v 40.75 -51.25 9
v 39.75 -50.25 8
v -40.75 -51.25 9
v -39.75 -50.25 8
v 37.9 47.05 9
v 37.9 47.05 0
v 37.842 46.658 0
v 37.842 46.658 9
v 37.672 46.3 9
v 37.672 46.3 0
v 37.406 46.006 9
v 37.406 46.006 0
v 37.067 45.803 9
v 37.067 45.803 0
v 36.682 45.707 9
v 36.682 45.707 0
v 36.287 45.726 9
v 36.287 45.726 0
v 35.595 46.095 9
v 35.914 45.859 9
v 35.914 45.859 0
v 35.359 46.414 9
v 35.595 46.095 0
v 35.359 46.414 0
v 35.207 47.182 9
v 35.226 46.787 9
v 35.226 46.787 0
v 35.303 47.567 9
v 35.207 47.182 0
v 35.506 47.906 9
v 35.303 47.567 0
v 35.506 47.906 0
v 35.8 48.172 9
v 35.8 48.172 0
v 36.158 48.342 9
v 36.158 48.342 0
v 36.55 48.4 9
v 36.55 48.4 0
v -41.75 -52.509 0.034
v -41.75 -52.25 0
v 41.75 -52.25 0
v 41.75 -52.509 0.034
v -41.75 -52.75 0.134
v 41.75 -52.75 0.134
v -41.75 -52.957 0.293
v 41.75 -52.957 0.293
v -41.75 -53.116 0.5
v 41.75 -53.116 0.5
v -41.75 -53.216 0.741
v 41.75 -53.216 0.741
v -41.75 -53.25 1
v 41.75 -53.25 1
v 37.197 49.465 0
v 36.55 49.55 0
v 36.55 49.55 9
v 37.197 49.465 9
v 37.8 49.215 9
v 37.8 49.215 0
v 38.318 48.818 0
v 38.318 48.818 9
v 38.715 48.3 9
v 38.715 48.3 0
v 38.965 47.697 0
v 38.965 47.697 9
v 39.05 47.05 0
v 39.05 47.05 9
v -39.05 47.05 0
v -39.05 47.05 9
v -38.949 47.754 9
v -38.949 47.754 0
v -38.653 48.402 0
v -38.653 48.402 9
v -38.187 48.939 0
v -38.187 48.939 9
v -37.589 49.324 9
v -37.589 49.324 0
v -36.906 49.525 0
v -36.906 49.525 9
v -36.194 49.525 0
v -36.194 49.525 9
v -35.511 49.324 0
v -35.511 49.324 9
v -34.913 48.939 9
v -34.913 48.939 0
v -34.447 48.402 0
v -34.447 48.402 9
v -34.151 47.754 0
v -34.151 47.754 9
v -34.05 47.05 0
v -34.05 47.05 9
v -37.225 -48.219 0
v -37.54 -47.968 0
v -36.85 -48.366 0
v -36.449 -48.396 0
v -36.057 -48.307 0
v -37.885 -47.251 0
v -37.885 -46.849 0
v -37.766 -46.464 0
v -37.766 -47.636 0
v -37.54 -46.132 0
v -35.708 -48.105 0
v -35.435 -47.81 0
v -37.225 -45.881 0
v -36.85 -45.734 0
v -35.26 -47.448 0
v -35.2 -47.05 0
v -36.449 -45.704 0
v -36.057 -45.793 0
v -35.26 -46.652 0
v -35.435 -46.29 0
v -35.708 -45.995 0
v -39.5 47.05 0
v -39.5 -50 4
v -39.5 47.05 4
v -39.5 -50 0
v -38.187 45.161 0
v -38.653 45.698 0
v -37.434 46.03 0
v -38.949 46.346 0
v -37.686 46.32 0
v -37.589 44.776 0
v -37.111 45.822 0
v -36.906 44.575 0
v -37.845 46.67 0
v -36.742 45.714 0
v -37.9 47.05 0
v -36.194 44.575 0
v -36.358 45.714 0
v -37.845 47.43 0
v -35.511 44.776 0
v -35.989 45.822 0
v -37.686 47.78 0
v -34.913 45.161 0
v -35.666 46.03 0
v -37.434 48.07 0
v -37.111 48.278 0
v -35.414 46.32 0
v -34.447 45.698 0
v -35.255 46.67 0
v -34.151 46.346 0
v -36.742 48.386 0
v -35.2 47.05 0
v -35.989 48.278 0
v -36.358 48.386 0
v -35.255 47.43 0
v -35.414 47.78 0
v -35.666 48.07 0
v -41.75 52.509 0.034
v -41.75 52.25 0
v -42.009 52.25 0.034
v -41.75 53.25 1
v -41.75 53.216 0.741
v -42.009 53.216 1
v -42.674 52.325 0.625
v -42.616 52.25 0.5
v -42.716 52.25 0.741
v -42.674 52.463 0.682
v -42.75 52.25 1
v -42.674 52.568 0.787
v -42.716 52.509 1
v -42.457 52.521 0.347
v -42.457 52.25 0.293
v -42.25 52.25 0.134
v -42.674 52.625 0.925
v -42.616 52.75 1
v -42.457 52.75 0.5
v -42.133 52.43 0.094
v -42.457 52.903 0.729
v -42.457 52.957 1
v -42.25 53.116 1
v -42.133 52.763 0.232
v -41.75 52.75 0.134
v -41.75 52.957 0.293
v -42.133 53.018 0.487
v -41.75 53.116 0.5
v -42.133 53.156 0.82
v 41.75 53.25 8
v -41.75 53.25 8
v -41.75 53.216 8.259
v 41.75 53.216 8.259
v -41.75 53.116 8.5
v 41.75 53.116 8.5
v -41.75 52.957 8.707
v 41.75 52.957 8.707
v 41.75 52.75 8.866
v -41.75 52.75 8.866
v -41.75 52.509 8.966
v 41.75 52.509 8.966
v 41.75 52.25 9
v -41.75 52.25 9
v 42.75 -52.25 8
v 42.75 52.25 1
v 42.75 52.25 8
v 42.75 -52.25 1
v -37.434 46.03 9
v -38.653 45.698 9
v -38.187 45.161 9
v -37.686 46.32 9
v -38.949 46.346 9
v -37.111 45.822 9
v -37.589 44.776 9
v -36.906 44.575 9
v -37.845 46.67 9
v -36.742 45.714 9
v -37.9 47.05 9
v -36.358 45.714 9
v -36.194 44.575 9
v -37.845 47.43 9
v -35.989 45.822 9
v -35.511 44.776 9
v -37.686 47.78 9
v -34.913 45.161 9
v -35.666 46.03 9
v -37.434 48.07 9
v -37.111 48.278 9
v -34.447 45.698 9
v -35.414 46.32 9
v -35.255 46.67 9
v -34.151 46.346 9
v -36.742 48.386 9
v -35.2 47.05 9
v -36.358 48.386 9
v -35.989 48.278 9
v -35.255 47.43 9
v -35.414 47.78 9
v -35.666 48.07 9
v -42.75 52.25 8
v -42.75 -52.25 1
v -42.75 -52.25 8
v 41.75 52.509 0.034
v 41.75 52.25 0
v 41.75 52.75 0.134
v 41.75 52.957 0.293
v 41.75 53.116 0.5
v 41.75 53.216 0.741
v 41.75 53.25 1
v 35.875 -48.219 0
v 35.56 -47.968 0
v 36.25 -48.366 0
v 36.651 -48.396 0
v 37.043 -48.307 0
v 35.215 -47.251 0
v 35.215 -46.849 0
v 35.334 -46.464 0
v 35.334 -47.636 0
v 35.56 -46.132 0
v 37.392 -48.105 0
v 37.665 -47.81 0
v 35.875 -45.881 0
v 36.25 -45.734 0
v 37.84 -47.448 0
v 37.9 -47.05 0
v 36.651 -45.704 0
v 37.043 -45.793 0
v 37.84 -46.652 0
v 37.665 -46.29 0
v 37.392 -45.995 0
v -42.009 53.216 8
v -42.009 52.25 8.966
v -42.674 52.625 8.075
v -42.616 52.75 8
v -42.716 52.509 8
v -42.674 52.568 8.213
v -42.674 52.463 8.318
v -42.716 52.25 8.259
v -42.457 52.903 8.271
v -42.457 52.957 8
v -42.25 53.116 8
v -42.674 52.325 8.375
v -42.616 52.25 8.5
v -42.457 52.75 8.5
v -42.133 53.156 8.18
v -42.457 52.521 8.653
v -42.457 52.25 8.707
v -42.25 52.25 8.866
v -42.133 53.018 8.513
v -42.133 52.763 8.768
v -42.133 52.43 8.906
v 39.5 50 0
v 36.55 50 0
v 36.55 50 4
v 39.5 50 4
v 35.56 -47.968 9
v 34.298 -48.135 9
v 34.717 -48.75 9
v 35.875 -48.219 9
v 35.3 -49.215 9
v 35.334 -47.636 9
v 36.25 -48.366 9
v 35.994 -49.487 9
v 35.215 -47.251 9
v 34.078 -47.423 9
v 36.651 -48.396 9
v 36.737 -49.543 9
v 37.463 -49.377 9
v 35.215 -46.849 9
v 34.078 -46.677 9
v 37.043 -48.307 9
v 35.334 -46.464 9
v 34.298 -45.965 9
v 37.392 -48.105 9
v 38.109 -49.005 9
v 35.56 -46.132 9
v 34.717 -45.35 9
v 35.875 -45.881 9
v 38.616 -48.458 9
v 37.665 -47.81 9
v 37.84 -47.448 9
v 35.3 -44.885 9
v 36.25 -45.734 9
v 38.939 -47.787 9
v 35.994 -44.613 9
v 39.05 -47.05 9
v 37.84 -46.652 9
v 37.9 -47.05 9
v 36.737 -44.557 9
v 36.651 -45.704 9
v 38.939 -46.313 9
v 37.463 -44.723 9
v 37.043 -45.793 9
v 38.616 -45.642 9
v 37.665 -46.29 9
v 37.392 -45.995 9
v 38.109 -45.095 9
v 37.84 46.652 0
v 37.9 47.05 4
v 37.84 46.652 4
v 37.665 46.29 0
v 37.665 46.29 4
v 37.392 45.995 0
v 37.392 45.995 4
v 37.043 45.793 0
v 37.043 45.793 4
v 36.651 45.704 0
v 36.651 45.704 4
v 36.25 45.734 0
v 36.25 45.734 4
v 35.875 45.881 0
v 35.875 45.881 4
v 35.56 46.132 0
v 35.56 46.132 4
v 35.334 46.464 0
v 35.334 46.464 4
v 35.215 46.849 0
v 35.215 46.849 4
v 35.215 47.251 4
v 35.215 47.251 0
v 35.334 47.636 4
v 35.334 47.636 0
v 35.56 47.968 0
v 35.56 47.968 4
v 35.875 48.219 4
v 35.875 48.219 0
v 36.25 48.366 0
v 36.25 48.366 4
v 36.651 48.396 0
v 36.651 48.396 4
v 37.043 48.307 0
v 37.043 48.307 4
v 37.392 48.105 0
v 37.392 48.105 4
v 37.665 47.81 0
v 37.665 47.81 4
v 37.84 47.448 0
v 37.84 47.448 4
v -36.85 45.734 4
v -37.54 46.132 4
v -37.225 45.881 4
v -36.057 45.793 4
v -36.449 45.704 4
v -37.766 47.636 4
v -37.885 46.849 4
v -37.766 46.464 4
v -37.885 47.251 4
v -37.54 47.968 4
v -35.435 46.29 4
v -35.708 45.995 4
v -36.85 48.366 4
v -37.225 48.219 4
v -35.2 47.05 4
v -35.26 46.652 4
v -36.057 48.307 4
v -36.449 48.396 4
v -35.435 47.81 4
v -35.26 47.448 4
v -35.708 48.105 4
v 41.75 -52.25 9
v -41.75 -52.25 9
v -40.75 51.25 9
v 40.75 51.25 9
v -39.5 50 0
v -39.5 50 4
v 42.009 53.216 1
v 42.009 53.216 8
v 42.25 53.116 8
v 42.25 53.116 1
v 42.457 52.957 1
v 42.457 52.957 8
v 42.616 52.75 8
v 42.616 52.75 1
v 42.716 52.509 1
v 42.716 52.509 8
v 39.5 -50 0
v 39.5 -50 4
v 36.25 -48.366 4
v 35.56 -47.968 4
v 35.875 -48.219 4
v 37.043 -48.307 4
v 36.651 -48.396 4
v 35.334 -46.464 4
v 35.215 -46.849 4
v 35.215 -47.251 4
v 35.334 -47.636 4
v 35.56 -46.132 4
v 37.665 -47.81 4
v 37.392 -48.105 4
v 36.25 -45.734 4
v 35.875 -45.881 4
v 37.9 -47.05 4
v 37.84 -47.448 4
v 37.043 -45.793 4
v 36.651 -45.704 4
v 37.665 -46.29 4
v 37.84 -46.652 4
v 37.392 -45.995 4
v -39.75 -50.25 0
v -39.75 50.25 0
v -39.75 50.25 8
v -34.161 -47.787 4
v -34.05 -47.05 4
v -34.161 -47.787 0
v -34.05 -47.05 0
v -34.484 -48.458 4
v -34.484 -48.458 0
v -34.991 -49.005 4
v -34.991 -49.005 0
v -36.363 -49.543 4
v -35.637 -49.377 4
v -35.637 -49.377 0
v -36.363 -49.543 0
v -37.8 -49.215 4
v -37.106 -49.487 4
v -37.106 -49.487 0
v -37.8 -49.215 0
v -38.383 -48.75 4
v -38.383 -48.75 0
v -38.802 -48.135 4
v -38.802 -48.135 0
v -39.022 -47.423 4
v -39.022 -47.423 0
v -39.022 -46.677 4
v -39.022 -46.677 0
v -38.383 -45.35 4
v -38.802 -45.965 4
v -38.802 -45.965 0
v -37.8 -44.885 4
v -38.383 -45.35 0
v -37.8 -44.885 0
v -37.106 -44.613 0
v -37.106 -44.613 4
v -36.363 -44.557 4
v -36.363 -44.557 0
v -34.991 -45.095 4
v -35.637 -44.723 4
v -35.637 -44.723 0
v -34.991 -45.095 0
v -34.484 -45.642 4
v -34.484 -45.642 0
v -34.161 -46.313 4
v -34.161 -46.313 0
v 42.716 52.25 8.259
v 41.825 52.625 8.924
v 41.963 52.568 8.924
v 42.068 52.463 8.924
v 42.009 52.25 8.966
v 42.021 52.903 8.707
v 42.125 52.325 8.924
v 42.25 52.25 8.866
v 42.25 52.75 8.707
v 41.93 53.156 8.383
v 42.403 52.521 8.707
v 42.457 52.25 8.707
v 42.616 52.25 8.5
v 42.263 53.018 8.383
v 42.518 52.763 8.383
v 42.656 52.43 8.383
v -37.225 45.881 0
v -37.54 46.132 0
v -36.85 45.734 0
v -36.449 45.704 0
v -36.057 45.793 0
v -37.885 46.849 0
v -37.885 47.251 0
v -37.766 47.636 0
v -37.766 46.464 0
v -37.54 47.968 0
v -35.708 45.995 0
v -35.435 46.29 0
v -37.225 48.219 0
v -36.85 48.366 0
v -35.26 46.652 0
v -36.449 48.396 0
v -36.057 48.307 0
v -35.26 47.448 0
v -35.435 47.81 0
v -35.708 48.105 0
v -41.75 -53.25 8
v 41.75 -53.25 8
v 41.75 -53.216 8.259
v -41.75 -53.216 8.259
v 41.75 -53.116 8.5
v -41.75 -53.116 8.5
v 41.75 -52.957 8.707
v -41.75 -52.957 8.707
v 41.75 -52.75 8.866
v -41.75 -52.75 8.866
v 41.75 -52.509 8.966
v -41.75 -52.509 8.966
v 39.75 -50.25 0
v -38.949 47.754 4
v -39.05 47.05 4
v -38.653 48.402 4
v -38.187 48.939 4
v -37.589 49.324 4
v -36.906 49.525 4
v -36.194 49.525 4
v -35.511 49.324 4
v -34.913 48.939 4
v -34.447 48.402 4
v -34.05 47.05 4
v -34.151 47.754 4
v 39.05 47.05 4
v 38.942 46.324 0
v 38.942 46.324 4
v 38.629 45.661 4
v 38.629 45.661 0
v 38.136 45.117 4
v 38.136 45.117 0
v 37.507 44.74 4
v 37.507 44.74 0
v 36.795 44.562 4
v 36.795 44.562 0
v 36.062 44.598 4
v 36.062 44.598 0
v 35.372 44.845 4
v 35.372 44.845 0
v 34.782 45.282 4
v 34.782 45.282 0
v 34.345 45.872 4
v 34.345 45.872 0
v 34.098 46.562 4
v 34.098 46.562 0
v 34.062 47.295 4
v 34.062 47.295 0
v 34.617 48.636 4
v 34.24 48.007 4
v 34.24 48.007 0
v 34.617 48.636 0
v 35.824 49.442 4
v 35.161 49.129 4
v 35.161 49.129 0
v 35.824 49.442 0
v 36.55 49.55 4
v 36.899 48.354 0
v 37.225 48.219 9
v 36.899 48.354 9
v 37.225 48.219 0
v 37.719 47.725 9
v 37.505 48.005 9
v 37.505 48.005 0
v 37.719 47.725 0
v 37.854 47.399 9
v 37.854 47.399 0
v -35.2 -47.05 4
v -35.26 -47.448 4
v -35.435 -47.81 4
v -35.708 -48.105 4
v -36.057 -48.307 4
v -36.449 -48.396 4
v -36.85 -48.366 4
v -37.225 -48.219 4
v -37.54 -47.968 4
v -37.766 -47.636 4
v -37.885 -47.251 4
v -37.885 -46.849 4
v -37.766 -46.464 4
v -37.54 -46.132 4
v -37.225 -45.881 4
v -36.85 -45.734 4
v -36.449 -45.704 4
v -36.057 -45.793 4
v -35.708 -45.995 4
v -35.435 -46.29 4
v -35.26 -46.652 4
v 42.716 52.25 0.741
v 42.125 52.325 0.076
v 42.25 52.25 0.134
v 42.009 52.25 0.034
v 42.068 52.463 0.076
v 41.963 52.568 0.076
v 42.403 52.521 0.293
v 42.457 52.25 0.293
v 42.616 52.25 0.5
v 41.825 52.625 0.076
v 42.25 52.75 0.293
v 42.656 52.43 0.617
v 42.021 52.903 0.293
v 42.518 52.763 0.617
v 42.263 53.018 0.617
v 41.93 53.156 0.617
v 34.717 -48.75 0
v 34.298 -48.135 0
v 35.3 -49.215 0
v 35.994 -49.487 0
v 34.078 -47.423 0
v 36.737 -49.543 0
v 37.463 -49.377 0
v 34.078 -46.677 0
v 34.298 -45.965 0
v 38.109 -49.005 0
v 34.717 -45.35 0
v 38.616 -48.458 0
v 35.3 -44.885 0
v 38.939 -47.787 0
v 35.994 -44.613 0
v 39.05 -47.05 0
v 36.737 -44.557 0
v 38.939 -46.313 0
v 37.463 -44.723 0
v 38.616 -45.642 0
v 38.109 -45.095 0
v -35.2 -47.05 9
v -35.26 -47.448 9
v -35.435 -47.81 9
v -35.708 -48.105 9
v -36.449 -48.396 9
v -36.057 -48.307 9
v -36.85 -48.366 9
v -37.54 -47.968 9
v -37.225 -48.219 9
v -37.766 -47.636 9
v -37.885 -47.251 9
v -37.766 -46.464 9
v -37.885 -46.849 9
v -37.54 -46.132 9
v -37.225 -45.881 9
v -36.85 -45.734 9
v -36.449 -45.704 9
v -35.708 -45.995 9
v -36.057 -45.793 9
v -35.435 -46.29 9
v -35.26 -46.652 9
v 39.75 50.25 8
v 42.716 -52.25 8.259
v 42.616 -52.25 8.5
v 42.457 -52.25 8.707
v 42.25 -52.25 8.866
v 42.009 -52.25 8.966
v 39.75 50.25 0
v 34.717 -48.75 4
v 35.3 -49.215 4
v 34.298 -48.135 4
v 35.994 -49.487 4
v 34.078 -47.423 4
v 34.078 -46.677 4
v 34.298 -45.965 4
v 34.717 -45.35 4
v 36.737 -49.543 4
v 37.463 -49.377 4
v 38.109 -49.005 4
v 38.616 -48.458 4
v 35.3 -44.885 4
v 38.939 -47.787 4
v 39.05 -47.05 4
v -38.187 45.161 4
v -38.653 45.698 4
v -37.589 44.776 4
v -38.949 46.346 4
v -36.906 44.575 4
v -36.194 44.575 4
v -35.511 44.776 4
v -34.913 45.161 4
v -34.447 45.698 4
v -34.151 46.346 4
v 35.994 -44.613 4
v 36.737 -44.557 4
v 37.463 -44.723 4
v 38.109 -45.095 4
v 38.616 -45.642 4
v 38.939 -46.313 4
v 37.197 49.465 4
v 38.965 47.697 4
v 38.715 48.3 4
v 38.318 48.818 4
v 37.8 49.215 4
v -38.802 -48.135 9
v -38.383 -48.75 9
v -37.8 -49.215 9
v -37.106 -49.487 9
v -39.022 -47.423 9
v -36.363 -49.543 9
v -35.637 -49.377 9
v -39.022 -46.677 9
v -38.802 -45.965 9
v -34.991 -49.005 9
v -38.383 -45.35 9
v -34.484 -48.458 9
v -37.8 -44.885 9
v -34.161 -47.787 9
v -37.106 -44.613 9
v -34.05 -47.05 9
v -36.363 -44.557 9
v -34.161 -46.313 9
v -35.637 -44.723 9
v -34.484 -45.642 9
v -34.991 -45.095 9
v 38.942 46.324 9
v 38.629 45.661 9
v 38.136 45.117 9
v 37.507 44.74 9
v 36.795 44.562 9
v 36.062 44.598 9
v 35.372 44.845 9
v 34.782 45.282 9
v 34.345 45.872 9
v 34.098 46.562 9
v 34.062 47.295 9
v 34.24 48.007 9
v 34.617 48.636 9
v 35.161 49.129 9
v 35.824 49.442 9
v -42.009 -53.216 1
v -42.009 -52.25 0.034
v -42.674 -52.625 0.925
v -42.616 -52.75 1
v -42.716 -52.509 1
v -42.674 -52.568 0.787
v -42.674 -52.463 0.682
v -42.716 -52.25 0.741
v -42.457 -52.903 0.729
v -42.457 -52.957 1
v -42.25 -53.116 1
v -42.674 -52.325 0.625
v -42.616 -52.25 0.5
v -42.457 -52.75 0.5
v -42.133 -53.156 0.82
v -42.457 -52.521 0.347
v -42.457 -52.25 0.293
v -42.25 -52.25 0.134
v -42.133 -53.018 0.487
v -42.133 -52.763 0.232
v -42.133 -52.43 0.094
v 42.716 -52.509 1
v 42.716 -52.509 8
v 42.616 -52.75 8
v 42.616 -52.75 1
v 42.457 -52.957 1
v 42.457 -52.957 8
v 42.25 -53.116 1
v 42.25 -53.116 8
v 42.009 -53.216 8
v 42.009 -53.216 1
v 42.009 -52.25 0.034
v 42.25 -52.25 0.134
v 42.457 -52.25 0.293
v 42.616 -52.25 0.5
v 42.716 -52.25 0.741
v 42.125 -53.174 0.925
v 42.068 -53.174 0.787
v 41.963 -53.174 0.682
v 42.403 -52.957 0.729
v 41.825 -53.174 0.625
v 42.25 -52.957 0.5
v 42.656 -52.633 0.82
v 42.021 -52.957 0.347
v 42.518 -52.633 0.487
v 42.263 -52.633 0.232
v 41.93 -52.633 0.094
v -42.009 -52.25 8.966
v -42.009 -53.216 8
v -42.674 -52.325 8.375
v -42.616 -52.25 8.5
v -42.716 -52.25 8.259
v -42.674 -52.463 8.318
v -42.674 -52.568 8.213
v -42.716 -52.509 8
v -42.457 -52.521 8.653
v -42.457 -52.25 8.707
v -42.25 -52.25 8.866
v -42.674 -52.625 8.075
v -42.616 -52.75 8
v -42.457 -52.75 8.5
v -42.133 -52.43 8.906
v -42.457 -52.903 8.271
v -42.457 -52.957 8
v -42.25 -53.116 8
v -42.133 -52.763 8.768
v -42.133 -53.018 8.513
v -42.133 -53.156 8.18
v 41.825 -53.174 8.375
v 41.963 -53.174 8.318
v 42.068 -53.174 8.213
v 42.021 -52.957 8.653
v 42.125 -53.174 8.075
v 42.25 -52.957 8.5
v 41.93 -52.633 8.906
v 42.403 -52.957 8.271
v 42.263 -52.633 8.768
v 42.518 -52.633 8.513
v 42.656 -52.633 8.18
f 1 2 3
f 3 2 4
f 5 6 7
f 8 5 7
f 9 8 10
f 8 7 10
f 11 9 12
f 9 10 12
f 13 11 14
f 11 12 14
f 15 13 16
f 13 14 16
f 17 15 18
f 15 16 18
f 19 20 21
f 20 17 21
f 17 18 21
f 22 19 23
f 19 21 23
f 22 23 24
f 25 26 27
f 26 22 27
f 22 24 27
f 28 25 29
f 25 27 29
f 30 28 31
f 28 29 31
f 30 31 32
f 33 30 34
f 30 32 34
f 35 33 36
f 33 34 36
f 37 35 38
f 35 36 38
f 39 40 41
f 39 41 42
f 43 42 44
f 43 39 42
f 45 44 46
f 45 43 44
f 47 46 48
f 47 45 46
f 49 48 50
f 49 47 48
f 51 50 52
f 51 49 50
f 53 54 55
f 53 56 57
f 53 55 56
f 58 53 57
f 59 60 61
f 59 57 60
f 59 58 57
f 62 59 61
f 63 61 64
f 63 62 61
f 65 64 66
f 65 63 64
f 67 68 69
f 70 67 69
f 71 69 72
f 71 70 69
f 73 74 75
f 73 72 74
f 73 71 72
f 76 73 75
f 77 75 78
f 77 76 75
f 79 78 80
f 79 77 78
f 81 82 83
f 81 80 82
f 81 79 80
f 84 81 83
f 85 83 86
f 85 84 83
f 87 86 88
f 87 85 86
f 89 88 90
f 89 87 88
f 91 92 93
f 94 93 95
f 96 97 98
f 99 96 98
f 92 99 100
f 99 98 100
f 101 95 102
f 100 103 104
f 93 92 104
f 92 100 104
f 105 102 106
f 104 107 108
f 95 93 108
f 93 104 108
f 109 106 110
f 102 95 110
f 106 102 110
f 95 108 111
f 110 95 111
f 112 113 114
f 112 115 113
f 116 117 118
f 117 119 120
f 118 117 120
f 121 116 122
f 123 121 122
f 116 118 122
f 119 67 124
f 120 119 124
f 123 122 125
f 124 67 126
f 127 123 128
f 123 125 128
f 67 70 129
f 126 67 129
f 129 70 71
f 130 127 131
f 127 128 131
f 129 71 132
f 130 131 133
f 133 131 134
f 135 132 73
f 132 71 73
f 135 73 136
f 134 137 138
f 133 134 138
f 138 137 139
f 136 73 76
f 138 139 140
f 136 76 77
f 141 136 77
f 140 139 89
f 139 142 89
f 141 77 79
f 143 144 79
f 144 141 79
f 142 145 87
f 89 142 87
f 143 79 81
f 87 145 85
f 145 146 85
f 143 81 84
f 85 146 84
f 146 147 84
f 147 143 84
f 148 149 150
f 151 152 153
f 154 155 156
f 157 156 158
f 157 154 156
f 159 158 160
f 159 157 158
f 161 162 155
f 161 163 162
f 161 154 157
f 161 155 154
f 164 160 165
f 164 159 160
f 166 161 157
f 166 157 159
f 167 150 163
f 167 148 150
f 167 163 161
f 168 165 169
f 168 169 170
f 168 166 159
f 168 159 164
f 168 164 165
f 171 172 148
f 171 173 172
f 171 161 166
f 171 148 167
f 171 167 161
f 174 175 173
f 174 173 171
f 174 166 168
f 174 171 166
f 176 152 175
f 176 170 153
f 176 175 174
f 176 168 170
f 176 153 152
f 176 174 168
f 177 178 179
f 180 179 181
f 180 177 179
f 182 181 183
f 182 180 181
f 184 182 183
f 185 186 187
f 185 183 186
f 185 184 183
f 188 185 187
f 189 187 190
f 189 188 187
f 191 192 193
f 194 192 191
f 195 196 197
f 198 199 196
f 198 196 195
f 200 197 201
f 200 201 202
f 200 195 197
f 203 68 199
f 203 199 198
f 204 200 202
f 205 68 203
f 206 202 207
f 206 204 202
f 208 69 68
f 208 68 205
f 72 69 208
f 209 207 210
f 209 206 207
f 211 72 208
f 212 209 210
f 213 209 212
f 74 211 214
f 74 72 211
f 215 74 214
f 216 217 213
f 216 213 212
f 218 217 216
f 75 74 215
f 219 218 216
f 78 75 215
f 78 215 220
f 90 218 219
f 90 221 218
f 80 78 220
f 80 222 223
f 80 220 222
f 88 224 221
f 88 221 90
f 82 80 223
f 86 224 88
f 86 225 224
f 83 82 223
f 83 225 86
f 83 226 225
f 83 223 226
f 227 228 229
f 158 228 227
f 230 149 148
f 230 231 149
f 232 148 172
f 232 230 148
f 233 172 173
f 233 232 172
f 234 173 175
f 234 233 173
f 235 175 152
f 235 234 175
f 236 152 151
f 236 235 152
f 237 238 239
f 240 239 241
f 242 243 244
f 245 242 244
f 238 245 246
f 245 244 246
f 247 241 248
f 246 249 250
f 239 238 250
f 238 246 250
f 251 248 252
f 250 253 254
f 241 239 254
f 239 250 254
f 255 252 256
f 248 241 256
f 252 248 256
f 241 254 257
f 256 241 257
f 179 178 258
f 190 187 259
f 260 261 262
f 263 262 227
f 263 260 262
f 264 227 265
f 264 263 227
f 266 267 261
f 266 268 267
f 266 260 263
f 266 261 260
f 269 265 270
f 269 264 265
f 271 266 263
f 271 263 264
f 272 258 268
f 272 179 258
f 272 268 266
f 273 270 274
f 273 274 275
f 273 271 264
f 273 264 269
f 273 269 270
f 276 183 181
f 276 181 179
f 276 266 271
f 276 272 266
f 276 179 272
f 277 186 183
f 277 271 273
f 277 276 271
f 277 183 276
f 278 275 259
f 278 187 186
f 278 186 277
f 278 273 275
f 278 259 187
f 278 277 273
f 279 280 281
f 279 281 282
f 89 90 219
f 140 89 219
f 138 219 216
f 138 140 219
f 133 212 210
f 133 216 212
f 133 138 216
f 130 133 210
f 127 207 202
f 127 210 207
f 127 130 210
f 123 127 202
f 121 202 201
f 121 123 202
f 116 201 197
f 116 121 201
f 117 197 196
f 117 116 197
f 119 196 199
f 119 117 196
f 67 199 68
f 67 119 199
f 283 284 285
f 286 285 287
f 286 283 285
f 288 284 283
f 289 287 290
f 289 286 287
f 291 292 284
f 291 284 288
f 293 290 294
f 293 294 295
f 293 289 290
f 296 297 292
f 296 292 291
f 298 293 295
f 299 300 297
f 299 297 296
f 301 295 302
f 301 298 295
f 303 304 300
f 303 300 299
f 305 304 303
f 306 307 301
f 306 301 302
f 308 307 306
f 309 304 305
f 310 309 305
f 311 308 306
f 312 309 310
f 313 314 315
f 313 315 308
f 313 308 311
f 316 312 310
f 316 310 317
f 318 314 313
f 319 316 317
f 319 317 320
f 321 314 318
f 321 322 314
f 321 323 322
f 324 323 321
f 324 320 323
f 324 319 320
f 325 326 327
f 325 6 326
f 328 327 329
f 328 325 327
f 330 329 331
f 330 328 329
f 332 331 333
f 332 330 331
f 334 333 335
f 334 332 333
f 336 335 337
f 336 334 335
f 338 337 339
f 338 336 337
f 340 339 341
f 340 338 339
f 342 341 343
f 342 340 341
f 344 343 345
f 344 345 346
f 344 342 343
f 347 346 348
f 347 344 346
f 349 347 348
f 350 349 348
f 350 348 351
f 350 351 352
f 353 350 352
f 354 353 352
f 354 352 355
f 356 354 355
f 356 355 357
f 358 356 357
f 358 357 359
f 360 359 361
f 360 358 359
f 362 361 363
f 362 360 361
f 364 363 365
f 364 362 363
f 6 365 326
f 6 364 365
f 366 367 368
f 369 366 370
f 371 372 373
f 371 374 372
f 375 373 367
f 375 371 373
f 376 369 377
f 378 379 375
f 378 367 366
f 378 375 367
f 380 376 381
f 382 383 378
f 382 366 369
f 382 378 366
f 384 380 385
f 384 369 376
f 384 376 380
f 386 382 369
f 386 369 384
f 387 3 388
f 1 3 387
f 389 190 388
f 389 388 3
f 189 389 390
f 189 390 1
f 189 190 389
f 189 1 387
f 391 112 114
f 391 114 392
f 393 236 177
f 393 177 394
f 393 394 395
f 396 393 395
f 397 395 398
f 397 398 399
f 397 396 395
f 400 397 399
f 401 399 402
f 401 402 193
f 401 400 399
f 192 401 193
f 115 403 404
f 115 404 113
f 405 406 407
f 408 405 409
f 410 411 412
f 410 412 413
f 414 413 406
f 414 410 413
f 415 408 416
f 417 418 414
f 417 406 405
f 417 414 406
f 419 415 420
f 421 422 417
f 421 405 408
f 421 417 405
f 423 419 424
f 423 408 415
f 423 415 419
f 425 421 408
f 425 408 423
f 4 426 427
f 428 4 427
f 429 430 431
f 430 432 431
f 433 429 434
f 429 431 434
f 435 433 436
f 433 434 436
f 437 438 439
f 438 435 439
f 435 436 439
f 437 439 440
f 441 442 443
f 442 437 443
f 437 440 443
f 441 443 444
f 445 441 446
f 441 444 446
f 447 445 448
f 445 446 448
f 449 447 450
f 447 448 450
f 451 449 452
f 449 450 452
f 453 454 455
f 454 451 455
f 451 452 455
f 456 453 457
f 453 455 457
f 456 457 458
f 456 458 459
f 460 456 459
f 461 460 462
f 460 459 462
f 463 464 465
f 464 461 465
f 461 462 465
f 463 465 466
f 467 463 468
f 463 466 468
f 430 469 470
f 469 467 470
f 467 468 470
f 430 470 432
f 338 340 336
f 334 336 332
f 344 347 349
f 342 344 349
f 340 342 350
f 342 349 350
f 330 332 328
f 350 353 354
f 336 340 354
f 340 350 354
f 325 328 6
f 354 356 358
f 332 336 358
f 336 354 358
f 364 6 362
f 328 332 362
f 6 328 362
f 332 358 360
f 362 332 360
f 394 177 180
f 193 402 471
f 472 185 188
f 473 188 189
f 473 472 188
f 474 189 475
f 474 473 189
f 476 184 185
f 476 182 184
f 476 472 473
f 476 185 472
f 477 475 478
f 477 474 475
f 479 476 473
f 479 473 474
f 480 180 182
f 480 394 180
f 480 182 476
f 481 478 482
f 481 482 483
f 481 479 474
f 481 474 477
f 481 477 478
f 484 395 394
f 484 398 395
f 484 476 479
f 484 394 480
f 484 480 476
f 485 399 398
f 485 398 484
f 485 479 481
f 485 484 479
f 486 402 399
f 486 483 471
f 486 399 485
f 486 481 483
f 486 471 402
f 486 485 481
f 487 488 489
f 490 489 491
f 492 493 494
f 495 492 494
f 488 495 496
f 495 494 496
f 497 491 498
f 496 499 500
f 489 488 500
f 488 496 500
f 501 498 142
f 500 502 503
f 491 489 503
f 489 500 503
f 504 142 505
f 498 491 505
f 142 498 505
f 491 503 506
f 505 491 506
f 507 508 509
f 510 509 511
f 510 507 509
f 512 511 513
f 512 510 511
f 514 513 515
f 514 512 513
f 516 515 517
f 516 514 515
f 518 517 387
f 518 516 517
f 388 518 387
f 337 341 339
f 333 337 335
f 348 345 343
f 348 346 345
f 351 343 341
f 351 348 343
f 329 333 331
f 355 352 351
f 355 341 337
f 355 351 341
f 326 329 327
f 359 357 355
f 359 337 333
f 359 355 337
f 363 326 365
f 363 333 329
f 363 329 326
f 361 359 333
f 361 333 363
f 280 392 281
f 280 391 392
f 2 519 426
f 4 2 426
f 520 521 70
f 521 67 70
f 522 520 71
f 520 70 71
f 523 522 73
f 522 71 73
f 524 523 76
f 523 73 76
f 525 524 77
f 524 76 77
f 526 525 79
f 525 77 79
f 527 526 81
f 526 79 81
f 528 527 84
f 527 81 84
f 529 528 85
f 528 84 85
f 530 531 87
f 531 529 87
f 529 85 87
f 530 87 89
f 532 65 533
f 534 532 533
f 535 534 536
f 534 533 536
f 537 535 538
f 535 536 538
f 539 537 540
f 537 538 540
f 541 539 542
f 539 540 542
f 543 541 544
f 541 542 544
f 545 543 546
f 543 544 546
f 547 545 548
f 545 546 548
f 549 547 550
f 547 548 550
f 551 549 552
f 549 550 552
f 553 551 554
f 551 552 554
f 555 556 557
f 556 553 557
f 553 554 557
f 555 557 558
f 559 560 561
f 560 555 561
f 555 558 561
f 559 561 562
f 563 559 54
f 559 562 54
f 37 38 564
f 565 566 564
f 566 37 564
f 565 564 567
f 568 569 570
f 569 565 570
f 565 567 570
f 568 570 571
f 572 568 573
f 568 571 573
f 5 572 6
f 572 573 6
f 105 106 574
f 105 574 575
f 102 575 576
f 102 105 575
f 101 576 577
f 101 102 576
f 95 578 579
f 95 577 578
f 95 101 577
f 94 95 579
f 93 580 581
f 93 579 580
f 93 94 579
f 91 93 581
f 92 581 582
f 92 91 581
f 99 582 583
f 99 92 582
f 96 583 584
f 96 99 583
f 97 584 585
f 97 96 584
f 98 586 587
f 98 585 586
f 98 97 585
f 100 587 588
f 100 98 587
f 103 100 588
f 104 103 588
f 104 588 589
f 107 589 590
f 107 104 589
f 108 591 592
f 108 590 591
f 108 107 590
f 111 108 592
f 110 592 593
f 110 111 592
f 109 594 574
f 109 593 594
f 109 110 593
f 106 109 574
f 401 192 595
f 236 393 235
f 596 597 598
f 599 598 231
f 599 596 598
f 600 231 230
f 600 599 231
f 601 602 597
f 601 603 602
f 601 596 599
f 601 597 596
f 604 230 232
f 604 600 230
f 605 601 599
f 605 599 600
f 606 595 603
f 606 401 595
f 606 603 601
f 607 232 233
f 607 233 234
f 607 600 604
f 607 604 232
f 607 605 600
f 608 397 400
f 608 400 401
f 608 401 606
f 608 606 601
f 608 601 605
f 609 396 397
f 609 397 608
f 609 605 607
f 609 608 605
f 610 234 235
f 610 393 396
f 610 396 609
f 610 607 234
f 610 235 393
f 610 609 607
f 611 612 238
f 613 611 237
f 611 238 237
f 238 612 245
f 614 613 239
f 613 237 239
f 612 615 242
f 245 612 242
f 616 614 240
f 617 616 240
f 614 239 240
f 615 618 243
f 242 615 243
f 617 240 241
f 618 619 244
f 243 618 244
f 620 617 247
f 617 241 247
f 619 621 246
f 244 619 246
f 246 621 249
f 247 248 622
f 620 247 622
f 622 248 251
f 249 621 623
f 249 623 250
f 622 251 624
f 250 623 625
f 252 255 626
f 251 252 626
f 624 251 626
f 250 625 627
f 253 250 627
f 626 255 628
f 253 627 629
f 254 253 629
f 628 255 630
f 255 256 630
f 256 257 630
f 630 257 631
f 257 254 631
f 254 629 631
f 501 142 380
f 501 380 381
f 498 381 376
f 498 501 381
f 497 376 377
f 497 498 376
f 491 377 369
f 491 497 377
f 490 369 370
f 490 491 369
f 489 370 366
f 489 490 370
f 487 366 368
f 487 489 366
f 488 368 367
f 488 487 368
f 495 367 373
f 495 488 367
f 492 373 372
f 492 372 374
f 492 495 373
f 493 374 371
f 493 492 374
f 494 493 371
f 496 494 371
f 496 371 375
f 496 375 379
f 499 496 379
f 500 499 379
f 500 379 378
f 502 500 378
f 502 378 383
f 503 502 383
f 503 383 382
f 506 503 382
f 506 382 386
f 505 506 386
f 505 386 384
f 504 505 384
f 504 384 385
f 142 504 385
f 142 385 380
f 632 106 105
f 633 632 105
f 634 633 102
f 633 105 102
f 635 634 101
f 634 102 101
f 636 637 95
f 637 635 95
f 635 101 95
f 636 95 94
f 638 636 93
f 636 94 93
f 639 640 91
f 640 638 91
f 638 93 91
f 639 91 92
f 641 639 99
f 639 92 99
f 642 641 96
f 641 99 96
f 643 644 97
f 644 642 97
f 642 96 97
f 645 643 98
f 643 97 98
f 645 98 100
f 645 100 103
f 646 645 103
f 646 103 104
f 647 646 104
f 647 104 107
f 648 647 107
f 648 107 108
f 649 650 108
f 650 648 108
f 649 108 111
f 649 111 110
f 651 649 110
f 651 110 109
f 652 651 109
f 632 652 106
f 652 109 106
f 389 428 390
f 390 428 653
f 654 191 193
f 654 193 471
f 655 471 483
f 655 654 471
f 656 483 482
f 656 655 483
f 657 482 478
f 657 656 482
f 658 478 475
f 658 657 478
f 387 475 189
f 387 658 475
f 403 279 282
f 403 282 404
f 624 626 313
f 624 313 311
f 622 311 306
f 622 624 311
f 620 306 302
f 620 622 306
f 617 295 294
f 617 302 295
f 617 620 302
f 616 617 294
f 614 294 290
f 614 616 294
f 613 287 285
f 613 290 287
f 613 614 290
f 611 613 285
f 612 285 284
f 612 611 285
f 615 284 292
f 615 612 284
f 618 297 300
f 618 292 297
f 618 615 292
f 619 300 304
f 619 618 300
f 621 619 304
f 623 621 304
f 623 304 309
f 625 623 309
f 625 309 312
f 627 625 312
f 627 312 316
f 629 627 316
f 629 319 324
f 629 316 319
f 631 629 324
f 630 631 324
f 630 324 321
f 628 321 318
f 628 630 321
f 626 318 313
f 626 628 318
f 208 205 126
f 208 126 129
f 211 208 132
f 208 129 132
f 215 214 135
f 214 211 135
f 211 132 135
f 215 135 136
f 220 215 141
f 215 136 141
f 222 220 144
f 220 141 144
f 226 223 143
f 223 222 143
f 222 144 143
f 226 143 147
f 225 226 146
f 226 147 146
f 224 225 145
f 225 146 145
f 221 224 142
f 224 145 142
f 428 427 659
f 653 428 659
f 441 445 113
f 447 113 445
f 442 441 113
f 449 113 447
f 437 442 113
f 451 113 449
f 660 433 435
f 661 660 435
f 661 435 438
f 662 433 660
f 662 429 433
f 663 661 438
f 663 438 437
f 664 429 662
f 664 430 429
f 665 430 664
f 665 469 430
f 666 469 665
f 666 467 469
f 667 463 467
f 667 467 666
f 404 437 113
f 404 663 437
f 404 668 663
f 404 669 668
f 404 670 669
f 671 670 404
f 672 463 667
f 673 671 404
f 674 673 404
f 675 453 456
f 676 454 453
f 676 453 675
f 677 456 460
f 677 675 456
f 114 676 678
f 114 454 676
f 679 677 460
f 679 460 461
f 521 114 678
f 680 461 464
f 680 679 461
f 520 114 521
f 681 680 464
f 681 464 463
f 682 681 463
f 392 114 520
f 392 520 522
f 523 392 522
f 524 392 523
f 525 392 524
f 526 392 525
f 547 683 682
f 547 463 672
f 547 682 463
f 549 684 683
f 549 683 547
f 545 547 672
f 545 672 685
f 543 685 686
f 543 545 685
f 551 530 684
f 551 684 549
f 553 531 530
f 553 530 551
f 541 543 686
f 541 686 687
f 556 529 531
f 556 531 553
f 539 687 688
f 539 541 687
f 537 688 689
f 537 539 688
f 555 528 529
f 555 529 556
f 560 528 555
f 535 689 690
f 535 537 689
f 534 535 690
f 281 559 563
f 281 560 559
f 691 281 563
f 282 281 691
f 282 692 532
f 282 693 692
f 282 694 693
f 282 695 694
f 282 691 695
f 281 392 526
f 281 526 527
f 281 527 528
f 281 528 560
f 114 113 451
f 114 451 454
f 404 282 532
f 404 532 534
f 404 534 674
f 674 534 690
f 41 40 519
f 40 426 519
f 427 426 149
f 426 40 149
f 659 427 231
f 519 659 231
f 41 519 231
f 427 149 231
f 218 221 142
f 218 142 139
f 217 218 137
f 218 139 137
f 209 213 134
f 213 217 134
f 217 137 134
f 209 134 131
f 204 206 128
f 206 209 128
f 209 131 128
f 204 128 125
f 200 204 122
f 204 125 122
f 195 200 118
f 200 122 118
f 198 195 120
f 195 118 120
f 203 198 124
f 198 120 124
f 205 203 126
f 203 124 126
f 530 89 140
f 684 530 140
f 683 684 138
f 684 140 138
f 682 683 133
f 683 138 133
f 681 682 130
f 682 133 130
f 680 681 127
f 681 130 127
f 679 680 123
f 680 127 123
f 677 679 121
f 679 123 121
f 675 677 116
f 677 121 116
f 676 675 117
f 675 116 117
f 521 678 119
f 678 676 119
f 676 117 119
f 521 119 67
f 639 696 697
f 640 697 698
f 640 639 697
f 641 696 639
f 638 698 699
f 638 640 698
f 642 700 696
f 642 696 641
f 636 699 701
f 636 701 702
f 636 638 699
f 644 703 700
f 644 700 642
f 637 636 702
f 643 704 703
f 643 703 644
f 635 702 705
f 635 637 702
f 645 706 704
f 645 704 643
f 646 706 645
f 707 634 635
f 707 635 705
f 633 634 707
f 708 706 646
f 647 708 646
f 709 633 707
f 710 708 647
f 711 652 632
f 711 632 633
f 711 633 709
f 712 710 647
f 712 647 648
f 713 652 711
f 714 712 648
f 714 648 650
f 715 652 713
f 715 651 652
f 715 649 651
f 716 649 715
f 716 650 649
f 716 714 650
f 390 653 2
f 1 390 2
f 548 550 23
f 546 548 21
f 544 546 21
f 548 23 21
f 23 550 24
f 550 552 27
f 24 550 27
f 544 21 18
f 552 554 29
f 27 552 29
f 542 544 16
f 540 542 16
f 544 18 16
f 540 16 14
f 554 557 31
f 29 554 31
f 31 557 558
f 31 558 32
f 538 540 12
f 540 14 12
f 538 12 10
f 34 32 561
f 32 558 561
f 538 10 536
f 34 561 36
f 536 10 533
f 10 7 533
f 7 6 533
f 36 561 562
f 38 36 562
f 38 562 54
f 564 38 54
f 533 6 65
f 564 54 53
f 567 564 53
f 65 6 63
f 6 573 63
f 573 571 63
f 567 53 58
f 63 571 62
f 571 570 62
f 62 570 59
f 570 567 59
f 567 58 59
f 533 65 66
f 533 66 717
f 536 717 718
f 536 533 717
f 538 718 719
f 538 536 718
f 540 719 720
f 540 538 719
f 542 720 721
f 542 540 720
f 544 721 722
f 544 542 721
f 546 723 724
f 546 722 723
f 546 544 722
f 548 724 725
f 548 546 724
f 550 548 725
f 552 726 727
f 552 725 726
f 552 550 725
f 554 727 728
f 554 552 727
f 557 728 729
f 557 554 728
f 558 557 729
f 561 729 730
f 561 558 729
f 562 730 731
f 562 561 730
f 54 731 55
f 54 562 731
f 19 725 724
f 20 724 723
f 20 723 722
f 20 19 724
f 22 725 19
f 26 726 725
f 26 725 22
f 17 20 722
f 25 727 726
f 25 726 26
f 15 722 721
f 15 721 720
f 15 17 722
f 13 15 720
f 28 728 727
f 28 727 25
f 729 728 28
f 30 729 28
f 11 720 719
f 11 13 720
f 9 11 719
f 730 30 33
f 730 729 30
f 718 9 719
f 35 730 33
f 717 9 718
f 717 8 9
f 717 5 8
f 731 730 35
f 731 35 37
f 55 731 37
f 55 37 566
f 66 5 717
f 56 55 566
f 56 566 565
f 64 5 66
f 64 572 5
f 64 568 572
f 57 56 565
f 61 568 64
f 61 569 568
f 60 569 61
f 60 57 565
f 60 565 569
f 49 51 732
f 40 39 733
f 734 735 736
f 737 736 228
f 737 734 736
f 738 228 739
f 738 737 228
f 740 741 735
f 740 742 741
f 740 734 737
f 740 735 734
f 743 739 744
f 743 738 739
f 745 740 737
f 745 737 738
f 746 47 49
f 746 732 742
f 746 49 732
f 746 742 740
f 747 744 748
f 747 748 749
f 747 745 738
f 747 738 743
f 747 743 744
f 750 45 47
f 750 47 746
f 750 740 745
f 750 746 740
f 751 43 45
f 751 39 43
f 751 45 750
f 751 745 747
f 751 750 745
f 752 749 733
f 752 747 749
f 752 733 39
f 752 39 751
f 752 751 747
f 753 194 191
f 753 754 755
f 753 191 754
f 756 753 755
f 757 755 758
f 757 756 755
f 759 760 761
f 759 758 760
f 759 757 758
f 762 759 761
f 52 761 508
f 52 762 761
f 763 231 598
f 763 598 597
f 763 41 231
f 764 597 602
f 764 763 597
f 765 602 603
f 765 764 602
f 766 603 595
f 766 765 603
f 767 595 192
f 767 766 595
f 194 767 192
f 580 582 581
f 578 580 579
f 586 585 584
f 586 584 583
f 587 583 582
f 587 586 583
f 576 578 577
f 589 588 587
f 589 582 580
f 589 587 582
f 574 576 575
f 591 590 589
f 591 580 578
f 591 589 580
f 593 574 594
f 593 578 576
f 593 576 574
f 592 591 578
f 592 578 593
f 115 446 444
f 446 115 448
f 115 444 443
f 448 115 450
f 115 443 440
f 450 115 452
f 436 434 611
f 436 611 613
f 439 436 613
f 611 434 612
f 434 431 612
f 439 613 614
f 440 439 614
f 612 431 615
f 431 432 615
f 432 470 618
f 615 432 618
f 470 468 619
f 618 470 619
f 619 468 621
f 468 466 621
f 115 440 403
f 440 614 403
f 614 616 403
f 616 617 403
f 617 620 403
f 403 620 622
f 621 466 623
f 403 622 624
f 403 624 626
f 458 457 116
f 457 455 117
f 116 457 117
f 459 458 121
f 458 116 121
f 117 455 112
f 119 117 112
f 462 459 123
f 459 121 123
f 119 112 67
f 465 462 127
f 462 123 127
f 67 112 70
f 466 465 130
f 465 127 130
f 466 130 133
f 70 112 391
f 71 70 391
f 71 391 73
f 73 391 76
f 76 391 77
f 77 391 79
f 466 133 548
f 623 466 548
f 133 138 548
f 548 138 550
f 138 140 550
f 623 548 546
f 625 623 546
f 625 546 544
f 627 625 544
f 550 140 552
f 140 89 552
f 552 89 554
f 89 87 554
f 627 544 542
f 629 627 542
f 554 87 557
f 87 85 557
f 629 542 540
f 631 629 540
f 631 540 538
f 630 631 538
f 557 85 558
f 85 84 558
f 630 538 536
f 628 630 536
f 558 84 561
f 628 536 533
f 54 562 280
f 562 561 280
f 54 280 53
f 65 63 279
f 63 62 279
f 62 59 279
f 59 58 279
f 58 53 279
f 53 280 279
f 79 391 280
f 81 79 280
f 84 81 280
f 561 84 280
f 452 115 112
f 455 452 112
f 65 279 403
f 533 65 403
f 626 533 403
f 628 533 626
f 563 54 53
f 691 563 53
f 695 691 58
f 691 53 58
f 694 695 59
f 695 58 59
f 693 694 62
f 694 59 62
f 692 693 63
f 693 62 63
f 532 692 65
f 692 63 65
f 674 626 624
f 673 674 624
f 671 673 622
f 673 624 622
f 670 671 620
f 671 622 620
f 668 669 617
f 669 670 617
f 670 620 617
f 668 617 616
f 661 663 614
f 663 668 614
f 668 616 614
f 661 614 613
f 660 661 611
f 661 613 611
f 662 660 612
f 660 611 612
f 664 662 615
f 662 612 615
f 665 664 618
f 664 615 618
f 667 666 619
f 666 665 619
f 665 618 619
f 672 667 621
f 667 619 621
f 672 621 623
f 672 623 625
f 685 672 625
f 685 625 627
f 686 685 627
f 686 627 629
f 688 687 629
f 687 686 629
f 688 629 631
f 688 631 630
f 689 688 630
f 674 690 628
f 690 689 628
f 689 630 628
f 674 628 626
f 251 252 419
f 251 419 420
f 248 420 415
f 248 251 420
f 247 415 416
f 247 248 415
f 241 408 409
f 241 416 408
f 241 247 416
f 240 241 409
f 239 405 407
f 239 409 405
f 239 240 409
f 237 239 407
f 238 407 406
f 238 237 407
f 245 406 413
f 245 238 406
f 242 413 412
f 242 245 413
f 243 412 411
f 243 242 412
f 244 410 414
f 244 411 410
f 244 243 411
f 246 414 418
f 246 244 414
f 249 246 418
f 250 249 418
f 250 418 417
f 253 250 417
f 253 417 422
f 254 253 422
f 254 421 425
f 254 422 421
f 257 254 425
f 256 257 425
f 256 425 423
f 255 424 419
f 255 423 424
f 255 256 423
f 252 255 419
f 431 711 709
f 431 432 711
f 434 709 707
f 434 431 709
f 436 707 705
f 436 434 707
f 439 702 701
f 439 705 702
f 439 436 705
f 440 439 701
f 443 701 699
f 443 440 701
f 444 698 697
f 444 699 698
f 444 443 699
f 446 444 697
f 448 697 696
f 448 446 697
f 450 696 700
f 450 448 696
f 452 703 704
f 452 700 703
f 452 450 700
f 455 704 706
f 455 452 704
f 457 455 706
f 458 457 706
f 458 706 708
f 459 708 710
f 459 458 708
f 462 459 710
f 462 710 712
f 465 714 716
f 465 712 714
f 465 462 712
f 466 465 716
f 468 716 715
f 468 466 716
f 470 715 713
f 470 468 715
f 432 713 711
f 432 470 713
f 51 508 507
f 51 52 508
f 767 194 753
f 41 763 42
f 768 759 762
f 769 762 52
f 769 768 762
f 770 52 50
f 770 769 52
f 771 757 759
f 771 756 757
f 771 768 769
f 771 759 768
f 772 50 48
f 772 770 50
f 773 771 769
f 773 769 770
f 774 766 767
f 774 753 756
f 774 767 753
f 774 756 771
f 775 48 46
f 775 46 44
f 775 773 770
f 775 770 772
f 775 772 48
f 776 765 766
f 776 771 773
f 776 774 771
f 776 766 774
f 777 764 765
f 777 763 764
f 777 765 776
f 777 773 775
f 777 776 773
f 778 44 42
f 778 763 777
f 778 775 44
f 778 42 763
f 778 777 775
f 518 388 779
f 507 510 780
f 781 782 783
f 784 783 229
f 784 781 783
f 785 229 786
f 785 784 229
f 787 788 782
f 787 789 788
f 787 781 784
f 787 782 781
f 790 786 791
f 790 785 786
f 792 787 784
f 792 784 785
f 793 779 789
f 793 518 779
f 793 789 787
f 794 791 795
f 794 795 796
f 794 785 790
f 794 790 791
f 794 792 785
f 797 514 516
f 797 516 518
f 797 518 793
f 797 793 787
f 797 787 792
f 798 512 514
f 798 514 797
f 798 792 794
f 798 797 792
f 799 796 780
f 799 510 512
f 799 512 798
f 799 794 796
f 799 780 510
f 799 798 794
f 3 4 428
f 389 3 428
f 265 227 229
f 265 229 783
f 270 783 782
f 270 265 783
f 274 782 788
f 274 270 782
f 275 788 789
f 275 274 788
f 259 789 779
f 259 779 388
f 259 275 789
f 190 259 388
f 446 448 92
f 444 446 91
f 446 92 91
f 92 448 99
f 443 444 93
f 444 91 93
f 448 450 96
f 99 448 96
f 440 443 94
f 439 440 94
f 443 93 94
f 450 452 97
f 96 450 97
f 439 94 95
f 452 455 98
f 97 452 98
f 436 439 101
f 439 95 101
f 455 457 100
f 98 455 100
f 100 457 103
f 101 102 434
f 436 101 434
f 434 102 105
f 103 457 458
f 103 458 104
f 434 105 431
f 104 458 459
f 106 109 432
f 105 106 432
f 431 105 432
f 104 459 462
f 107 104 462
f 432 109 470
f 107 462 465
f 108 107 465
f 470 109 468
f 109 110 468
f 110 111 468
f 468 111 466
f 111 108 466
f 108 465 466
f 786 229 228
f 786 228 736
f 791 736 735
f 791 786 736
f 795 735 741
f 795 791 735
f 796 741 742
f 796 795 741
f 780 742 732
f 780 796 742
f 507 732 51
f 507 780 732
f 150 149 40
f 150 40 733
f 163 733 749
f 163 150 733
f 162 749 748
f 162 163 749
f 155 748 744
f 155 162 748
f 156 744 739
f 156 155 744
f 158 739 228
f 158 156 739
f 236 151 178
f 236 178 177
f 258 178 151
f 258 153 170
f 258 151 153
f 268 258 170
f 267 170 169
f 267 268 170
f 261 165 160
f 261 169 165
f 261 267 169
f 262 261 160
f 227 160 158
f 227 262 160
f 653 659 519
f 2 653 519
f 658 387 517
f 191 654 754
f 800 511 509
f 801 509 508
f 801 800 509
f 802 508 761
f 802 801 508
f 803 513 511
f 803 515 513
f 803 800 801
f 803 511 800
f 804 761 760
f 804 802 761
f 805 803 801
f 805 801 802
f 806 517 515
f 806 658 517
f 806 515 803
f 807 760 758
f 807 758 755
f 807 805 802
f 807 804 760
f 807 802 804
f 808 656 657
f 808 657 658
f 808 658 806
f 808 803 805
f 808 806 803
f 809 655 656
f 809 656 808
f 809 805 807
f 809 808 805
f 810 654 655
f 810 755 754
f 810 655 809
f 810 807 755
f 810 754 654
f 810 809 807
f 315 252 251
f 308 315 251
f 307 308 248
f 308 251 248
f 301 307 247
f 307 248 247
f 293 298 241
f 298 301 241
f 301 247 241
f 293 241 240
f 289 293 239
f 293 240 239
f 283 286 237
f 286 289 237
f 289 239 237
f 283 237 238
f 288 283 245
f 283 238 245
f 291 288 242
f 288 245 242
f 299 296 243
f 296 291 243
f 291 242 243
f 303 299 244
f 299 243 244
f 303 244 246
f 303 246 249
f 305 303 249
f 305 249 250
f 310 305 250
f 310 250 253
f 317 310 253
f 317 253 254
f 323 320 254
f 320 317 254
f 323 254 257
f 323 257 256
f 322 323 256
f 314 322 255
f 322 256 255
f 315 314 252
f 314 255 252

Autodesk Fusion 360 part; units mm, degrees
sketch "Sketch1" plane through (0, 0, 0) normal (0, 0, 1) x (1, 0, 0)
  line L0 (39.5, -50) -> (-39.5, -50)
  line L1 (-39.5, -50) -> (-39.5, 50)
  line L2 (-39.5, 50) -> (39.5, 50)
  line L3 (39.5, 50) -> (39.5, -50)
  line L4 (39.5, -50) -> (-39.5, 50) construction
  line L5 (-39.5, -50) -> (39.5, 50) construction
  line L6 (39.5, 50) -> (36.55, 50)
  line L7 (36.55, 50) -> (36.55, 47.05)
  circle A0 centre (36.55, 47.05) radius 1.35
  circle A1 centre (36.55, 47.05) radius 2.5
  circle A2 centre (36.55, 47.05) radius 2.5
  circle A3 centre (36.55, 47.05) radius 1.35
  line L8 (-39.5, 50) -> (-39.5, 47.05)
  line L9 (-39.5, 47.05) -> (-36.55, 47.05)
  circle A4 centre (36.55, 47.05) radius 1.35
  circle A5 centre (36.55, 47.05) radius 2.5
  circle A6 centre (-36.55, 47.05) radius 1.35
  circle A7 centre (-36.55, 47.05) radius 2.5
  line L10 (0, 0) -> (5, 0)
  circle A8 centre (-36.55, -47.05) radius 2.5
  circle A9 centre (36.55, -47.05) radius 1.35
  circle A10 centre (36.55, -47.05) radius 2.5
  circle A11 centre (-36.55, -47.05) radius 1.35
  line L11 (-42.75, 53.25) -> (42.75, 53.25)
  line L12 (42.75, 53.25) -> (42.75, -53.25)
  line L13 (42.75, -53.25) -> (-42.75, -53.25)
  line L14 (-42.75, -53.25) -> (-42.75, 53.25)
  line L15 (39.75, 50.25) -> (39.75, -50.25)
  line L16 (39.75, -50.25) -> (-39.75, -50.25)
  line L17 (-39.75, -50.25) -> (-39.75, 50.25)
  line L18 (-39.75, 50.25) -> (39.75, 50.25)
  point P0 (36.55, -47.05)
  dimension "d1" = 79
  dimension "d2" = 100
  dimension "d3" = 2.95
  dimension "d4" = 2.95
  dimension "d5" = 2.7
  dimension "d6" = 5
  dimension "d7" = 2.7
  dimension "d8" = 5
  dimension "d9" = 2.95
  dimension "d10" = 2.7
  dimension "d11" = 5
  dimension "d12" = 2.7
  dimension "d13" = 5
  dimension "d14" = -3.25
  dimension "d15" = -0.25
extrude "Extrude1" add sketch "Sketch1" along normal blind 4 contours L0 L1 L2 L3 L6 L8 makes body 1
extrude "Extrude2" add sketch "Sketch1" along normal blind 5 separate body contours L11 L12 L13 L14 makes body 2
extrude "Extrude3" add sketch "Sketch1" along normal blind 10 separate body contours A1 A2 A5 | A7 | A8 | A10 makes body 3 at (39.0469, -47.1746, 6.6667) makes body 4 at (39.0469, 47.1746, 3.3333) makes body 5 at (-34.0531, -47.1746, 6.6667) makes body 6 at (-34.0531, 46.9254, 6.6667)
extrude "Extrude4" add 1 faces at (-41.75, -16.75, 5) along direction (0, 0, 1) blind 4 on bodies 2 bodies 2
extrude "Extrude5" add sketch "Sketch1" along normal blind 4 separate body contours A0 A3 A4 | A6 | A9 | A11 makes body 7 at (37.8933, 47.1844, 2.6667) makes body 8 at (-37.8933, -47.1844, 2.6667) makes body 9 at (-35.2067, 47.1844, 2.6667) makes body 10 at (35.2067, -47.1844, 2.6667)
extrude "Extrude6" cut 4 faces at (-34.4426, -47.1742, 10) (38.6574, -47.1742, 10) (38.6523, 47.2413, 10) (-34.4426, 46.9258, 10) along direction (0, 0, -1) blind 1 on bodies 3 4 5 6 bodies 3 4 5 6
fillet "Fillet1" radius 1 12 edges at (42.75, 53.25, 4.5) (0, 53.25, 9) (42.75, 0, 9) (0, 53.25, 0) (42.75, 0, 0) (42.75, -53.25, 4.5) (0, -53.25, 9) (0, -53.25, 0) (-42.75, -53.25, 4.5) (-42.75, 0, 9) (-42.75, 0, 0) (-42.75, 53.25, 4.5) on bodies 2
chamfer "Chamfer1" distance 1 angle 45 4 edges at (0, 50.25, 9) (-39.75, 0, 9) (39.75, 0, 9) (0, -50.25, 9) on bodies 2
